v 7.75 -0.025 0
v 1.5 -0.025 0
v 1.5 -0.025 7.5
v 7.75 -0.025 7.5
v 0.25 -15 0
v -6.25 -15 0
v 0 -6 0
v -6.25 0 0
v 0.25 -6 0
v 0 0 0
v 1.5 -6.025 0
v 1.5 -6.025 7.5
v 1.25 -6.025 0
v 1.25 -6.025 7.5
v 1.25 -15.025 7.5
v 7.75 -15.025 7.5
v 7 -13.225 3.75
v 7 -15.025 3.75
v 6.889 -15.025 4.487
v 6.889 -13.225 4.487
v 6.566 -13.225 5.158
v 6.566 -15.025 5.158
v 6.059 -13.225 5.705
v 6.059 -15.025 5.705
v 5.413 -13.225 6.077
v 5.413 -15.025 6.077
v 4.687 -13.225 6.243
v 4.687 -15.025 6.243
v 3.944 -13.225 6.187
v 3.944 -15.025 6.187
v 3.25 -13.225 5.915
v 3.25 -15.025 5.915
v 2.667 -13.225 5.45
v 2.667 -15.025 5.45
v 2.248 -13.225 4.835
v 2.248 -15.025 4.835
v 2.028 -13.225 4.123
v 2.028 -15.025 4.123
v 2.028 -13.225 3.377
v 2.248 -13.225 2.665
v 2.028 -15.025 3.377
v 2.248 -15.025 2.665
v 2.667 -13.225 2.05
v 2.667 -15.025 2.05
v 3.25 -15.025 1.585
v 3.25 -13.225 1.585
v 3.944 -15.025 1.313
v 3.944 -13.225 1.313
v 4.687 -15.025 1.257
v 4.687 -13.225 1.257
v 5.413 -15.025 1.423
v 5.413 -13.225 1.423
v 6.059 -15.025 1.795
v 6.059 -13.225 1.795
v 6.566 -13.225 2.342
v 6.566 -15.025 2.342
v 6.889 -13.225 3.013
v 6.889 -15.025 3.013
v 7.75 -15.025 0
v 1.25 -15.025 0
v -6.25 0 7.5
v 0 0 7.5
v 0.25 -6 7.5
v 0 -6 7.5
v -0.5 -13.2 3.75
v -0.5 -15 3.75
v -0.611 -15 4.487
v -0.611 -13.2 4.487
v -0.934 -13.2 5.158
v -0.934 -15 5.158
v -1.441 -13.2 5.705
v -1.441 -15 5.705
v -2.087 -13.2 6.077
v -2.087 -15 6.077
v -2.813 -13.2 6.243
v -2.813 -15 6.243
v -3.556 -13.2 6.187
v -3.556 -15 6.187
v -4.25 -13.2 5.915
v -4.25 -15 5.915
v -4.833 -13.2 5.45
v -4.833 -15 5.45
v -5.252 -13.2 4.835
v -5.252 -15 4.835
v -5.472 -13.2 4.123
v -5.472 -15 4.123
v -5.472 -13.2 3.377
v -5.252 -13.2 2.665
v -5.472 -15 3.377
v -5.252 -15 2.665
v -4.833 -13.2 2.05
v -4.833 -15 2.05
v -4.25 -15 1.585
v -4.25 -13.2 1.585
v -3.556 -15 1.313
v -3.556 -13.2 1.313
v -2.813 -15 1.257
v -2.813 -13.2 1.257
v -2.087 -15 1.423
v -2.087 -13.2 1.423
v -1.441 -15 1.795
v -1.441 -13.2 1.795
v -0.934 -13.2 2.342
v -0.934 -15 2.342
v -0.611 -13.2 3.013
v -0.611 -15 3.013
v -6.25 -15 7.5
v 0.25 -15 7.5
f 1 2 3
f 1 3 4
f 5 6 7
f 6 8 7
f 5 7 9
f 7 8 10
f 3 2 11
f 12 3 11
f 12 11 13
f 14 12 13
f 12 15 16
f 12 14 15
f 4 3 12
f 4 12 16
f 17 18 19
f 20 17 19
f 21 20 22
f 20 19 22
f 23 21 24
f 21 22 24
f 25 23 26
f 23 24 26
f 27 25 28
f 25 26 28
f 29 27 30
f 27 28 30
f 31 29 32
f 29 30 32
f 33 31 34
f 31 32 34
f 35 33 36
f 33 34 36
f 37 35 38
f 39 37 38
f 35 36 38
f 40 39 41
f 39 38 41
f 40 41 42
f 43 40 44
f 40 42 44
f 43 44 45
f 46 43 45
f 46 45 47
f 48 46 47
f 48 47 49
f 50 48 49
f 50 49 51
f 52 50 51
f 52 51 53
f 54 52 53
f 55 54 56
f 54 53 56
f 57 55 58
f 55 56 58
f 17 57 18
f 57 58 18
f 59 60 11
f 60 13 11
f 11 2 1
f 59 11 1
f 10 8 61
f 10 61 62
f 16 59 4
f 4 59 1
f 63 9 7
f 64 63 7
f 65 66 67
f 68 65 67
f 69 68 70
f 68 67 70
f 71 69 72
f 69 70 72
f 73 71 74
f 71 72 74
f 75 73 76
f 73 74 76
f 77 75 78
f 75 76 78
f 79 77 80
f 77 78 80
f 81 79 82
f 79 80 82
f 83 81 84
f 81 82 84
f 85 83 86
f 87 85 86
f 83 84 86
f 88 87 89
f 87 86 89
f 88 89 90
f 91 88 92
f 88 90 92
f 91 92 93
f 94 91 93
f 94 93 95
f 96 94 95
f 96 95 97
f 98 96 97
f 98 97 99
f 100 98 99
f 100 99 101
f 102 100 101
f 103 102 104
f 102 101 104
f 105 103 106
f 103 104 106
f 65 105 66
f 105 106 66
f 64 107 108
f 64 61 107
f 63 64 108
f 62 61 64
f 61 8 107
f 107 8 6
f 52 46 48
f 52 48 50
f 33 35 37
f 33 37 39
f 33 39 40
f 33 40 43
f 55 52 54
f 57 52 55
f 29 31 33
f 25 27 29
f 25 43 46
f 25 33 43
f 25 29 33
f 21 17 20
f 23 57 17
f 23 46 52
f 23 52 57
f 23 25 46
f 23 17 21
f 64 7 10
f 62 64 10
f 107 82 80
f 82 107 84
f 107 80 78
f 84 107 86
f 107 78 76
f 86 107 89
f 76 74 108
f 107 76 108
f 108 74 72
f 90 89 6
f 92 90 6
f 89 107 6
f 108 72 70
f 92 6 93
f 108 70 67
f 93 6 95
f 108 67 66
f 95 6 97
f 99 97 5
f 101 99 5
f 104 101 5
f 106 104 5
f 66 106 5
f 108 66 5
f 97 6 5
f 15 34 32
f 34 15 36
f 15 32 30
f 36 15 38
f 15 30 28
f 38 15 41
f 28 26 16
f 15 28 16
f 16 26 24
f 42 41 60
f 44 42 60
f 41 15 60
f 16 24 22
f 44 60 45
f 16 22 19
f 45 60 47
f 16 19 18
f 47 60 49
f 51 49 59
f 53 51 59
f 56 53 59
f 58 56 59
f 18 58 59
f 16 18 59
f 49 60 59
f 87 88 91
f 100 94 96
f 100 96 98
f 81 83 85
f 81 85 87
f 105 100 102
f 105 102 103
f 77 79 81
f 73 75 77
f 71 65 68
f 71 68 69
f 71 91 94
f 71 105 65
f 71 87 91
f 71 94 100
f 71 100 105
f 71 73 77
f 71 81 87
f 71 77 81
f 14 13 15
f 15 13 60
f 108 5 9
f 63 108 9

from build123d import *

# Parameters (mm, degrees)
F0_W     = 6.5
F0_H     = 2.5
F0_W_2   = 6.25
F0_H_2   = 5
F1_DEPTH = 7.5
F2_R     = 2.5
F3_R     = 2.5
F4_DEPTH = 1.8


with BuildPart() as f1:
    # F0 (on Top) → F1 (new body)
    with BuildSketch(Plane.XY):
        with Locations((-3, -13.75)):
            Rectangle(F0_W, F0_H)
        with Locations((4.5, -13.774836)):
            Rectangle(F0_W, F0_H)
        Polygon((0, -6), (0, -5), (-6.25, -5), (-6.25, -12.5), (0.25, -12.5), (0.25, -6), align=None)
        Polygon((7.75, -5.024836), (1.5, -5.024836), (1.5, -6.024836), (1.25, -6.024836), (1.25, -12.524836), (7.75, -12.524836), align=None)
        with Locations((4.625, -2.524836)):
            Rectangle(F0_W_2, F0_H_2)
        with Locations((-3.125, -2.5)):
            Rectangle(F0_W_2, F0_H_2)
    extrude(amount=F1_DEPTH)

    # F2 (on face) + F3 (on face) → F4 (cut)
    with BuildSketch(Plane.XZ.offset(15)):
        with Locations((-3, 3.75)):
            Circle(F2_R)
    with BuildSketch(Plane.XZ.offset(15.024836)):
        with Locations((4.5, 3.75)):
            Circle(F3_R)
    extrude(amount=-F4_DEPTH, mode=Mode.SUBTRACT)


solid = f1.part
